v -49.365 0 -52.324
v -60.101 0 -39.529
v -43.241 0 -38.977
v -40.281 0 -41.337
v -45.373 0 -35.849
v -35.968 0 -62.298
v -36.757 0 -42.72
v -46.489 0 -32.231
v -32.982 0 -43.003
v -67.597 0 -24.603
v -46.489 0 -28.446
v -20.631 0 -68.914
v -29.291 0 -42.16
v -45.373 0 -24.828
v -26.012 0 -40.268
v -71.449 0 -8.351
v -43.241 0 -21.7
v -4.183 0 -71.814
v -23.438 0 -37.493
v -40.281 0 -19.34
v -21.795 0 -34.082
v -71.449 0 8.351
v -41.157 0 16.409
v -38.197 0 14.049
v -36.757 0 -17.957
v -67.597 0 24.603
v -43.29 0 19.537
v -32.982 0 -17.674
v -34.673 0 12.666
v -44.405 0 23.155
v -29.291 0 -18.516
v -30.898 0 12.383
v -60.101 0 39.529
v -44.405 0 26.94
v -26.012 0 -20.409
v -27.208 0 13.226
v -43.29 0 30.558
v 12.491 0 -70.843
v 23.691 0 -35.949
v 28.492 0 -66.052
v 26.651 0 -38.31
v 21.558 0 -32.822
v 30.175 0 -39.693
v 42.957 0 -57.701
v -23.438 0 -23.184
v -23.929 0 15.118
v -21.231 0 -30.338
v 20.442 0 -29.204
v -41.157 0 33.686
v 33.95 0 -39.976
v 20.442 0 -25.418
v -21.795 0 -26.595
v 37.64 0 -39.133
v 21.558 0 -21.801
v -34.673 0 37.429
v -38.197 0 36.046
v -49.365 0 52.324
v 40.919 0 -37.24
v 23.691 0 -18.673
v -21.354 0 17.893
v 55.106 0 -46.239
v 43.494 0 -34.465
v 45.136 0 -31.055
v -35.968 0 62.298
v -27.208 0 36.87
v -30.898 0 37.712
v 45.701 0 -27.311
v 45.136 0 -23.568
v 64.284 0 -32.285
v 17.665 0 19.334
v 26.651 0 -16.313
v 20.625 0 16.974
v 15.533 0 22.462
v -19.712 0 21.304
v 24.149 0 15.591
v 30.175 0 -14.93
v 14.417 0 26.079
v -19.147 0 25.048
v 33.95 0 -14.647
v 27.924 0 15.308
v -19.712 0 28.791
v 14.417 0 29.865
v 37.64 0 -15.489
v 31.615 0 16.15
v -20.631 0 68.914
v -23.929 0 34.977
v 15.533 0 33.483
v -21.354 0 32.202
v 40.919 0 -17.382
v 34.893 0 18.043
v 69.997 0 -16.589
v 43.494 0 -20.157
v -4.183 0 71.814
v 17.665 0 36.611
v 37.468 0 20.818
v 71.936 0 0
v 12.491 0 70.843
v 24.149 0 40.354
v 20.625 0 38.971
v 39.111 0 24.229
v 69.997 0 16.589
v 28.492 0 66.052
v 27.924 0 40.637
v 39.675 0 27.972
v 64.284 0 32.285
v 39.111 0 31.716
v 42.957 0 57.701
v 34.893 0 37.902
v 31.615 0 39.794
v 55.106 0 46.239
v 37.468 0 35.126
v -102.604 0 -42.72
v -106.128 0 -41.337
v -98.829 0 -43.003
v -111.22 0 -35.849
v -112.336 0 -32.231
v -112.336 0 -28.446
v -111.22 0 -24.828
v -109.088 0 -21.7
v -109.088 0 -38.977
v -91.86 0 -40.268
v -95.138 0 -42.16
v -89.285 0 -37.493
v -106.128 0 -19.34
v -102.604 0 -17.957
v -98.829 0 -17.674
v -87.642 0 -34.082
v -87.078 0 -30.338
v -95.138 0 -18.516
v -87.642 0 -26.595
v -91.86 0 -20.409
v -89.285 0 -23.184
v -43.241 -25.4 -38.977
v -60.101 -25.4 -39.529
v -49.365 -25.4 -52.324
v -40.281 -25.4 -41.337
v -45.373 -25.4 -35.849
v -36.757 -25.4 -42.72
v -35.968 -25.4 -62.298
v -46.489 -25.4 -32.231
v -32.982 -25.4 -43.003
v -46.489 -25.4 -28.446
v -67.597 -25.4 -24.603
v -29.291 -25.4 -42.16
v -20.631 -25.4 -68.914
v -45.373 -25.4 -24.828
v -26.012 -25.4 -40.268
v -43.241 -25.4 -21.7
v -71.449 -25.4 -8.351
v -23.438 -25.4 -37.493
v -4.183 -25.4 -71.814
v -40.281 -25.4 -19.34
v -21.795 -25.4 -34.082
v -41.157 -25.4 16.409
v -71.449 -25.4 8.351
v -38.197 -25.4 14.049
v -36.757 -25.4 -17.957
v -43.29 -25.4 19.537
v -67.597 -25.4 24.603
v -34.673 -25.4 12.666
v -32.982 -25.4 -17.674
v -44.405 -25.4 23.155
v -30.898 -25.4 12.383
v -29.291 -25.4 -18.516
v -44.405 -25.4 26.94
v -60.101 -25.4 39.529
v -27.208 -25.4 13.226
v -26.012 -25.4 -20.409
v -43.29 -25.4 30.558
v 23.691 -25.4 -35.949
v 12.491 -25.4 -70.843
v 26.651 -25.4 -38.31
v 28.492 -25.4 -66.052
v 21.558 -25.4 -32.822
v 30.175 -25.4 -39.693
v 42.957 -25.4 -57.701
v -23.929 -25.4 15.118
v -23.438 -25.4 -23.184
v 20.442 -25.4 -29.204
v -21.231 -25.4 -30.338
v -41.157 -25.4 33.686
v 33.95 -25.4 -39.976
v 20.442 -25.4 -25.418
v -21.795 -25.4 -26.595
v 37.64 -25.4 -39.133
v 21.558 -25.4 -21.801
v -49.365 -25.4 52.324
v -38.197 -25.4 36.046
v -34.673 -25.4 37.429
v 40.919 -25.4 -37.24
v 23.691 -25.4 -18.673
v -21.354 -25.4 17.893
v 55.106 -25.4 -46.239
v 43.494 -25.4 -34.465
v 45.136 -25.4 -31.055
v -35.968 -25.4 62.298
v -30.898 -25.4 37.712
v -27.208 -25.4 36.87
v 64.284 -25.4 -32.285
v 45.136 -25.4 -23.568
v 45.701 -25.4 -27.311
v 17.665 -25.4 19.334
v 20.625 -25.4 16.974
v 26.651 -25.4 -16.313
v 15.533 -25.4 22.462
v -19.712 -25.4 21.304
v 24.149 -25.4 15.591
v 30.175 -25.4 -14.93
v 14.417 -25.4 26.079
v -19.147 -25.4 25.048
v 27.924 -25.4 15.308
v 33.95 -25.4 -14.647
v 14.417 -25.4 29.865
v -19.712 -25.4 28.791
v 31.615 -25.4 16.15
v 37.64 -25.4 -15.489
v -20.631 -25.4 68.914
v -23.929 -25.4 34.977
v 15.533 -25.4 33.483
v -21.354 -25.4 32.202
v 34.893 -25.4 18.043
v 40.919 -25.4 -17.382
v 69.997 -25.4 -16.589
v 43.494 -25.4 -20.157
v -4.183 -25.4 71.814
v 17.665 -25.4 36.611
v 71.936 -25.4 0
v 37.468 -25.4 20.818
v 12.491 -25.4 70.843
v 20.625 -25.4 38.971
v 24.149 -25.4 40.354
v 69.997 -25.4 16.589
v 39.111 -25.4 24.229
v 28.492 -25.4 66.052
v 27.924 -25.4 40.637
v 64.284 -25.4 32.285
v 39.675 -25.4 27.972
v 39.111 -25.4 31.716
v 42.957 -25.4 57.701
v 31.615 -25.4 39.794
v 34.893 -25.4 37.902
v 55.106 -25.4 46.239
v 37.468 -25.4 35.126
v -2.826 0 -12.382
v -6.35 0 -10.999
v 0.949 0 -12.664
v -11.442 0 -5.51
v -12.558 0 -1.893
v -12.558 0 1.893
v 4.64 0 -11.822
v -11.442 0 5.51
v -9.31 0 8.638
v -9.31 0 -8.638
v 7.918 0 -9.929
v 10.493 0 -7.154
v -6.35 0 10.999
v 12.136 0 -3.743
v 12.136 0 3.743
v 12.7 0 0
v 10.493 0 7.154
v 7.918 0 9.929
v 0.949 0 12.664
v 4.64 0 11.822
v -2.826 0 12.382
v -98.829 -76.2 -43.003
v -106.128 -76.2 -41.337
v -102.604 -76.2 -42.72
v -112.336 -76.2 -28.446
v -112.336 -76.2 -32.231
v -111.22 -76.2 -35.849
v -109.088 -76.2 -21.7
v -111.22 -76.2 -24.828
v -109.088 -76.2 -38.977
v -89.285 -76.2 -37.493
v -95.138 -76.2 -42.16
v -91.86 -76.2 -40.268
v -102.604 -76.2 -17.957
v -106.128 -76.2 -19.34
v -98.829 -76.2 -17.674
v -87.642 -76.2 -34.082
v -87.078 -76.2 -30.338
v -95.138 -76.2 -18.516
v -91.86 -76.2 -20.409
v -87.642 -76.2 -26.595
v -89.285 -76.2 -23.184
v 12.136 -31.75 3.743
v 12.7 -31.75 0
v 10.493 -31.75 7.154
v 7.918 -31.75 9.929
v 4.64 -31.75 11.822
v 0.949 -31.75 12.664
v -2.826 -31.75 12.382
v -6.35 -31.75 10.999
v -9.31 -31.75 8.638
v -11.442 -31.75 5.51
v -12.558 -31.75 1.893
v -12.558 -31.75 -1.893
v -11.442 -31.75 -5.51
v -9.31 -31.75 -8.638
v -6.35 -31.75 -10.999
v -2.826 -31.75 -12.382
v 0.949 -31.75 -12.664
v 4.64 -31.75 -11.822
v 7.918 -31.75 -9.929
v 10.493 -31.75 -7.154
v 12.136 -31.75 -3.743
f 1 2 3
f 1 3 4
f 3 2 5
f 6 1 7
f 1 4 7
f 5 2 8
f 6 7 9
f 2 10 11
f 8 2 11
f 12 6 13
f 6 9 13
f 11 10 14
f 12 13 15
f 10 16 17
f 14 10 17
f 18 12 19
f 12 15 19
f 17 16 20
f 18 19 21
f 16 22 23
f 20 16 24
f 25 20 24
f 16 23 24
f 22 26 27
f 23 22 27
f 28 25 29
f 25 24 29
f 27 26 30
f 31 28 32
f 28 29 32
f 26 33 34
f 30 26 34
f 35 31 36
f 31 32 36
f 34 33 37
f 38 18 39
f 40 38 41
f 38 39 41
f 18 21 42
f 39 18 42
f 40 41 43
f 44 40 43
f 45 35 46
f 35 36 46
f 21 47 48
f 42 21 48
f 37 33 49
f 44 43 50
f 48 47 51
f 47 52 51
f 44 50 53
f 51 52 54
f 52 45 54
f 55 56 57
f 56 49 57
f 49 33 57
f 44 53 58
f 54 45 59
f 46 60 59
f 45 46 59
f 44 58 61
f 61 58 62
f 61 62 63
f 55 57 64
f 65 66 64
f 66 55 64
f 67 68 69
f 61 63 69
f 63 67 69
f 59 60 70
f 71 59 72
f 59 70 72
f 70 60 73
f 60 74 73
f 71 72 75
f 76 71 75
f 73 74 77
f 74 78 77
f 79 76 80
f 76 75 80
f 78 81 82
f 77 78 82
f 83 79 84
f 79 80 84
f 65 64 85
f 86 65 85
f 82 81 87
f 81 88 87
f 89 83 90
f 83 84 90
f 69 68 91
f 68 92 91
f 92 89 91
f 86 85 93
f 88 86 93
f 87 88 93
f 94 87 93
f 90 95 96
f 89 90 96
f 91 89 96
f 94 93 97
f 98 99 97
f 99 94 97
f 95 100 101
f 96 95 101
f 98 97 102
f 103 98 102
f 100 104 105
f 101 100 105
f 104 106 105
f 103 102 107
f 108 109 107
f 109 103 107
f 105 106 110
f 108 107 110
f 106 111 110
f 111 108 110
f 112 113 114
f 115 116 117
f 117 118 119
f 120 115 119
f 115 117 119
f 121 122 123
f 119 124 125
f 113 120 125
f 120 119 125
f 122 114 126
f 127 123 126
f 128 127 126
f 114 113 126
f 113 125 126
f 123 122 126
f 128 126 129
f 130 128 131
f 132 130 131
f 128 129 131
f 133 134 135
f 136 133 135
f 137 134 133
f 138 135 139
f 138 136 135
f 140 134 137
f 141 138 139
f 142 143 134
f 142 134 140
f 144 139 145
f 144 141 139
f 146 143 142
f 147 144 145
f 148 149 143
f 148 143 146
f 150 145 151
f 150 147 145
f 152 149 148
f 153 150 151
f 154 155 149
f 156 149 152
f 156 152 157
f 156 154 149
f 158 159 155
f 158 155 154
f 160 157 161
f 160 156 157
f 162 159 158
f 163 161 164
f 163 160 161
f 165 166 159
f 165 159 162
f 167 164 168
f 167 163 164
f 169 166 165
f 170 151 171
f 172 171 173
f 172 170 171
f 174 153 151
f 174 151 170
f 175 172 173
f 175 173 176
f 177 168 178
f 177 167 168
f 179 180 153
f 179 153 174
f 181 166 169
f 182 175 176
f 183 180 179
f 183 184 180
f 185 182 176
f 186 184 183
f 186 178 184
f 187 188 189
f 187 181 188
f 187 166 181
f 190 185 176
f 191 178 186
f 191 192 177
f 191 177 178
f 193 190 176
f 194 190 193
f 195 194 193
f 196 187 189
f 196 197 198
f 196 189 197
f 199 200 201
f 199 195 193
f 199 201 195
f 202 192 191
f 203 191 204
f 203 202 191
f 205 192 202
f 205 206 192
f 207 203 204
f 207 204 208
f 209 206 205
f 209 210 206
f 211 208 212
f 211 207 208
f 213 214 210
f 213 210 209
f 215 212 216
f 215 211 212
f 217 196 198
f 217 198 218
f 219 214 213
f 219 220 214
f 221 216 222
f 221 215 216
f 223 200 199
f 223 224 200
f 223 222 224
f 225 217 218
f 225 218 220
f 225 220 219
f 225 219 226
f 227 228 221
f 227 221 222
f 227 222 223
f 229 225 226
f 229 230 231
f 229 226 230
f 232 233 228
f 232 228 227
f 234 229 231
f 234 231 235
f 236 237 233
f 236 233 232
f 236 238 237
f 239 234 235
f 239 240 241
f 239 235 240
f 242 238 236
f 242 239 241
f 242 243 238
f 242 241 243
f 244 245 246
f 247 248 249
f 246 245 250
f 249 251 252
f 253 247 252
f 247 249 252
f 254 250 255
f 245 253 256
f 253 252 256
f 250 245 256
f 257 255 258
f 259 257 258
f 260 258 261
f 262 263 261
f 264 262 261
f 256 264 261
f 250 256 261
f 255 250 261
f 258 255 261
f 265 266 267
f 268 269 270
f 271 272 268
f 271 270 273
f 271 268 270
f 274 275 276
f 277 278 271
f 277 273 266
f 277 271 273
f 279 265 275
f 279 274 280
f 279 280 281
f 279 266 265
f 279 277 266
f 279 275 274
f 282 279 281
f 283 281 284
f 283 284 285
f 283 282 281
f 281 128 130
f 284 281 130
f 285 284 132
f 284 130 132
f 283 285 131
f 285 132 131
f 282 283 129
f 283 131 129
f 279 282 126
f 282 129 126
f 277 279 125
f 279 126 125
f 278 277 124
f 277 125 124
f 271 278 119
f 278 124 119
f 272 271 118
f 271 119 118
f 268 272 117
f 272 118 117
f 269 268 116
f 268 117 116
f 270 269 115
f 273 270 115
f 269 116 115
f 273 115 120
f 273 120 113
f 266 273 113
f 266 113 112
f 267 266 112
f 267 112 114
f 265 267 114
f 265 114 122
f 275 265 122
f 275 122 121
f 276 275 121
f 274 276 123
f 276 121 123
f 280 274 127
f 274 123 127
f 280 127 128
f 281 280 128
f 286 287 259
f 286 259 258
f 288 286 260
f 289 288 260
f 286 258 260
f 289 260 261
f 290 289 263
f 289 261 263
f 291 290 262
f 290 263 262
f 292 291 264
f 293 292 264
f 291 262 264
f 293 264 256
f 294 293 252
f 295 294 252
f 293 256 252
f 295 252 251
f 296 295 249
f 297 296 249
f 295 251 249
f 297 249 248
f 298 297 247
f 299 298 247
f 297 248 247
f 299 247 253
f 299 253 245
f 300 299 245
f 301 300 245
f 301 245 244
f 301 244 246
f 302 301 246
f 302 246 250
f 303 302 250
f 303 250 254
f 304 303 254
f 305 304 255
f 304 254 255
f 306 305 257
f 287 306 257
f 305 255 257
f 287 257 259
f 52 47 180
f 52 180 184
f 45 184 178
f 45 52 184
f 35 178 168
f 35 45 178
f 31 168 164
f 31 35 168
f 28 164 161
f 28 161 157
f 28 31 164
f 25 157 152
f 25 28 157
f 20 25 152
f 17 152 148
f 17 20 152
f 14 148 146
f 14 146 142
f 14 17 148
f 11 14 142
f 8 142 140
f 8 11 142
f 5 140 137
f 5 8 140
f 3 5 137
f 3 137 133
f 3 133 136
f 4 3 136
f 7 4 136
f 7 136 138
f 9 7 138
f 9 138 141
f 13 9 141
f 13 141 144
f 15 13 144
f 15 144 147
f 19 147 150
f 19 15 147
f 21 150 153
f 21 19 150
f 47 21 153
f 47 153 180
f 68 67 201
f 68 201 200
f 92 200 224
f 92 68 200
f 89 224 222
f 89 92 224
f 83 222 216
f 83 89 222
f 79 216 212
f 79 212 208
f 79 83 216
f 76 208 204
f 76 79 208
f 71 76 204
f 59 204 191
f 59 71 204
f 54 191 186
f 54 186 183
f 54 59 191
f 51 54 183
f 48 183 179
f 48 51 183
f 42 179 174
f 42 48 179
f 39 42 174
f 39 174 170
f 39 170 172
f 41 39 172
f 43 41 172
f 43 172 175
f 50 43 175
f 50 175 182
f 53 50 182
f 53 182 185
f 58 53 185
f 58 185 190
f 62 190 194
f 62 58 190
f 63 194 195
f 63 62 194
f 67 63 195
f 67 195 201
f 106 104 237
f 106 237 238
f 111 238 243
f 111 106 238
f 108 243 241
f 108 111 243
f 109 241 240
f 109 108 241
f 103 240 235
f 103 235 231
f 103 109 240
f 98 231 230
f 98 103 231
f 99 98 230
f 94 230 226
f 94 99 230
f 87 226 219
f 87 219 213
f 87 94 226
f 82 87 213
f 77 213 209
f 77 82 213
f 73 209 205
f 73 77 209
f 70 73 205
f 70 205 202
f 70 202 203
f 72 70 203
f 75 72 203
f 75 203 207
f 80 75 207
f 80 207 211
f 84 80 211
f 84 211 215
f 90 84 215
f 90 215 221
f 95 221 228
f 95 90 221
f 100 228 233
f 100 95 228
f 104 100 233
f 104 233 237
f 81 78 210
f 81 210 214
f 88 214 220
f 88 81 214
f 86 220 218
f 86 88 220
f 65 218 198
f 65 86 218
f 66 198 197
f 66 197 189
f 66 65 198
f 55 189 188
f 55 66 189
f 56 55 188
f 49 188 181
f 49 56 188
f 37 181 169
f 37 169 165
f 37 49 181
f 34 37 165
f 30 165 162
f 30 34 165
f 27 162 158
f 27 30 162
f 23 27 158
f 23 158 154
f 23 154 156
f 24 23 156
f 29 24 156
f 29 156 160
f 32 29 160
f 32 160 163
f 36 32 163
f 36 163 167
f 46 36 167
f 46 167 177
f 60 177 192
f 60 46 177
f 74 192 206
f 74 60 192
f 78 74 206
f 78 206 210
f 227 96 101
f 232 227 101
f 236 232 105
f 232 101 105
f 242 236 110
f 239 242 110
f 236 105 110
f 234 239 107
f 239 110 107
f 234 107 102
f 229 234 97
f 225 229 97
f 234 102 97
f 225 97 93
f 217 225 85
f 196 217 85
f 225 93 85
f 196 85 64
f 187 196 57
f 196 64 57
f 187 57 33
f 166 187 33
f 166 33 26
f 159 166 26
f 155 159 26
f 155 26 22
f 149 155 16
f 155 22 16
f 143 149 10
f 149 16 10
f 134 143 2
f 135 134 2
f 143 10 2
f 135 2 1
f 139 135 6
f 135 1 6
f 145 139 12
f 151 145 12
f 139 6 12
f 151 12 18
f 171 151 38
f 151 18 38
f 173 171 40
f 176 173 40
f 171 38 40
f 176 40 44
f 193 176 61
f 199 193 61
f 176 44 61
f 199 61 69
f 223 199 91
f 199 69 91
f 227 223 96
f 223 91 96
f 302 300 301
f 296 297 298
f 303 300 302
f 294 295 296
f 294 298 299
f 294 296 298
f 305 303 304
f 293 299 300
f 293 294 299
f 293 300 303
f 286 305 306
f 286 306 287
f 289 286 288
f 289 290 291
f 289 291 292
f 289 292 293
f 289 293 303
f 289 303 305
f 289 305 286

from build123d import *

# Parameters (mm, degrees)
F0_R     = 71.9356029279
F0_R_2   = 12.7
F1_DEPTH = 25.4
F3_DEPTH = 31.75
F4_DEPTH = 76.2


# Not quite as in the source:
# - the program builds the solid bodies; features that only make, move or delete a surface that nothing else refers to are left out


with BuildPart() as f1:
    # F0 (on Front) → F1 (new body)
    with BuildSketch(Plane.XZ):
        Circle(F0_R)
        with Locations((-33.9307952672, -30.3383674473)):
            Circle(F0_R_2, mode=Mode.SUBTRACT)
        with Locations((-31.8473428488, 25.0476300716)):
            Circle(F0_R_2, mode=Mode.SUBTRACT)
        Circle(F0_R_2, mode=Mode.SUBTRACT)
        with Locations((33.0006089061, -27.3112040013)):
            Circle(F0_R_2, mode=Mode.SUBTRACT)
        with Locations((26.9748345017, 27.9723200947)):
            Circle(F0_R_2, mode=Mode.SUBTRACT)
        Circle(F0_R_2)
    extrude(amount=F1_DEPTH)


with BuildPart() as f3:
    # F0 (on Front) → F3 (new body)
    with BuildSketch(Plane.XZ):
        Circle(F0_R_2)
    extrude(amount=F3_DEPTH)


with BuildPart() as f4:
    # F0 (on Front) → F4 (new body)
    with BuildSketch(Plane.XZ):
        with Locations((-99.7780840844, -30.3383674473)):
            Circle(F0_R_2)
    extrude(amount=F4_DEPTH)


solid = Compound([f1.part, f3.part, f4.part])
